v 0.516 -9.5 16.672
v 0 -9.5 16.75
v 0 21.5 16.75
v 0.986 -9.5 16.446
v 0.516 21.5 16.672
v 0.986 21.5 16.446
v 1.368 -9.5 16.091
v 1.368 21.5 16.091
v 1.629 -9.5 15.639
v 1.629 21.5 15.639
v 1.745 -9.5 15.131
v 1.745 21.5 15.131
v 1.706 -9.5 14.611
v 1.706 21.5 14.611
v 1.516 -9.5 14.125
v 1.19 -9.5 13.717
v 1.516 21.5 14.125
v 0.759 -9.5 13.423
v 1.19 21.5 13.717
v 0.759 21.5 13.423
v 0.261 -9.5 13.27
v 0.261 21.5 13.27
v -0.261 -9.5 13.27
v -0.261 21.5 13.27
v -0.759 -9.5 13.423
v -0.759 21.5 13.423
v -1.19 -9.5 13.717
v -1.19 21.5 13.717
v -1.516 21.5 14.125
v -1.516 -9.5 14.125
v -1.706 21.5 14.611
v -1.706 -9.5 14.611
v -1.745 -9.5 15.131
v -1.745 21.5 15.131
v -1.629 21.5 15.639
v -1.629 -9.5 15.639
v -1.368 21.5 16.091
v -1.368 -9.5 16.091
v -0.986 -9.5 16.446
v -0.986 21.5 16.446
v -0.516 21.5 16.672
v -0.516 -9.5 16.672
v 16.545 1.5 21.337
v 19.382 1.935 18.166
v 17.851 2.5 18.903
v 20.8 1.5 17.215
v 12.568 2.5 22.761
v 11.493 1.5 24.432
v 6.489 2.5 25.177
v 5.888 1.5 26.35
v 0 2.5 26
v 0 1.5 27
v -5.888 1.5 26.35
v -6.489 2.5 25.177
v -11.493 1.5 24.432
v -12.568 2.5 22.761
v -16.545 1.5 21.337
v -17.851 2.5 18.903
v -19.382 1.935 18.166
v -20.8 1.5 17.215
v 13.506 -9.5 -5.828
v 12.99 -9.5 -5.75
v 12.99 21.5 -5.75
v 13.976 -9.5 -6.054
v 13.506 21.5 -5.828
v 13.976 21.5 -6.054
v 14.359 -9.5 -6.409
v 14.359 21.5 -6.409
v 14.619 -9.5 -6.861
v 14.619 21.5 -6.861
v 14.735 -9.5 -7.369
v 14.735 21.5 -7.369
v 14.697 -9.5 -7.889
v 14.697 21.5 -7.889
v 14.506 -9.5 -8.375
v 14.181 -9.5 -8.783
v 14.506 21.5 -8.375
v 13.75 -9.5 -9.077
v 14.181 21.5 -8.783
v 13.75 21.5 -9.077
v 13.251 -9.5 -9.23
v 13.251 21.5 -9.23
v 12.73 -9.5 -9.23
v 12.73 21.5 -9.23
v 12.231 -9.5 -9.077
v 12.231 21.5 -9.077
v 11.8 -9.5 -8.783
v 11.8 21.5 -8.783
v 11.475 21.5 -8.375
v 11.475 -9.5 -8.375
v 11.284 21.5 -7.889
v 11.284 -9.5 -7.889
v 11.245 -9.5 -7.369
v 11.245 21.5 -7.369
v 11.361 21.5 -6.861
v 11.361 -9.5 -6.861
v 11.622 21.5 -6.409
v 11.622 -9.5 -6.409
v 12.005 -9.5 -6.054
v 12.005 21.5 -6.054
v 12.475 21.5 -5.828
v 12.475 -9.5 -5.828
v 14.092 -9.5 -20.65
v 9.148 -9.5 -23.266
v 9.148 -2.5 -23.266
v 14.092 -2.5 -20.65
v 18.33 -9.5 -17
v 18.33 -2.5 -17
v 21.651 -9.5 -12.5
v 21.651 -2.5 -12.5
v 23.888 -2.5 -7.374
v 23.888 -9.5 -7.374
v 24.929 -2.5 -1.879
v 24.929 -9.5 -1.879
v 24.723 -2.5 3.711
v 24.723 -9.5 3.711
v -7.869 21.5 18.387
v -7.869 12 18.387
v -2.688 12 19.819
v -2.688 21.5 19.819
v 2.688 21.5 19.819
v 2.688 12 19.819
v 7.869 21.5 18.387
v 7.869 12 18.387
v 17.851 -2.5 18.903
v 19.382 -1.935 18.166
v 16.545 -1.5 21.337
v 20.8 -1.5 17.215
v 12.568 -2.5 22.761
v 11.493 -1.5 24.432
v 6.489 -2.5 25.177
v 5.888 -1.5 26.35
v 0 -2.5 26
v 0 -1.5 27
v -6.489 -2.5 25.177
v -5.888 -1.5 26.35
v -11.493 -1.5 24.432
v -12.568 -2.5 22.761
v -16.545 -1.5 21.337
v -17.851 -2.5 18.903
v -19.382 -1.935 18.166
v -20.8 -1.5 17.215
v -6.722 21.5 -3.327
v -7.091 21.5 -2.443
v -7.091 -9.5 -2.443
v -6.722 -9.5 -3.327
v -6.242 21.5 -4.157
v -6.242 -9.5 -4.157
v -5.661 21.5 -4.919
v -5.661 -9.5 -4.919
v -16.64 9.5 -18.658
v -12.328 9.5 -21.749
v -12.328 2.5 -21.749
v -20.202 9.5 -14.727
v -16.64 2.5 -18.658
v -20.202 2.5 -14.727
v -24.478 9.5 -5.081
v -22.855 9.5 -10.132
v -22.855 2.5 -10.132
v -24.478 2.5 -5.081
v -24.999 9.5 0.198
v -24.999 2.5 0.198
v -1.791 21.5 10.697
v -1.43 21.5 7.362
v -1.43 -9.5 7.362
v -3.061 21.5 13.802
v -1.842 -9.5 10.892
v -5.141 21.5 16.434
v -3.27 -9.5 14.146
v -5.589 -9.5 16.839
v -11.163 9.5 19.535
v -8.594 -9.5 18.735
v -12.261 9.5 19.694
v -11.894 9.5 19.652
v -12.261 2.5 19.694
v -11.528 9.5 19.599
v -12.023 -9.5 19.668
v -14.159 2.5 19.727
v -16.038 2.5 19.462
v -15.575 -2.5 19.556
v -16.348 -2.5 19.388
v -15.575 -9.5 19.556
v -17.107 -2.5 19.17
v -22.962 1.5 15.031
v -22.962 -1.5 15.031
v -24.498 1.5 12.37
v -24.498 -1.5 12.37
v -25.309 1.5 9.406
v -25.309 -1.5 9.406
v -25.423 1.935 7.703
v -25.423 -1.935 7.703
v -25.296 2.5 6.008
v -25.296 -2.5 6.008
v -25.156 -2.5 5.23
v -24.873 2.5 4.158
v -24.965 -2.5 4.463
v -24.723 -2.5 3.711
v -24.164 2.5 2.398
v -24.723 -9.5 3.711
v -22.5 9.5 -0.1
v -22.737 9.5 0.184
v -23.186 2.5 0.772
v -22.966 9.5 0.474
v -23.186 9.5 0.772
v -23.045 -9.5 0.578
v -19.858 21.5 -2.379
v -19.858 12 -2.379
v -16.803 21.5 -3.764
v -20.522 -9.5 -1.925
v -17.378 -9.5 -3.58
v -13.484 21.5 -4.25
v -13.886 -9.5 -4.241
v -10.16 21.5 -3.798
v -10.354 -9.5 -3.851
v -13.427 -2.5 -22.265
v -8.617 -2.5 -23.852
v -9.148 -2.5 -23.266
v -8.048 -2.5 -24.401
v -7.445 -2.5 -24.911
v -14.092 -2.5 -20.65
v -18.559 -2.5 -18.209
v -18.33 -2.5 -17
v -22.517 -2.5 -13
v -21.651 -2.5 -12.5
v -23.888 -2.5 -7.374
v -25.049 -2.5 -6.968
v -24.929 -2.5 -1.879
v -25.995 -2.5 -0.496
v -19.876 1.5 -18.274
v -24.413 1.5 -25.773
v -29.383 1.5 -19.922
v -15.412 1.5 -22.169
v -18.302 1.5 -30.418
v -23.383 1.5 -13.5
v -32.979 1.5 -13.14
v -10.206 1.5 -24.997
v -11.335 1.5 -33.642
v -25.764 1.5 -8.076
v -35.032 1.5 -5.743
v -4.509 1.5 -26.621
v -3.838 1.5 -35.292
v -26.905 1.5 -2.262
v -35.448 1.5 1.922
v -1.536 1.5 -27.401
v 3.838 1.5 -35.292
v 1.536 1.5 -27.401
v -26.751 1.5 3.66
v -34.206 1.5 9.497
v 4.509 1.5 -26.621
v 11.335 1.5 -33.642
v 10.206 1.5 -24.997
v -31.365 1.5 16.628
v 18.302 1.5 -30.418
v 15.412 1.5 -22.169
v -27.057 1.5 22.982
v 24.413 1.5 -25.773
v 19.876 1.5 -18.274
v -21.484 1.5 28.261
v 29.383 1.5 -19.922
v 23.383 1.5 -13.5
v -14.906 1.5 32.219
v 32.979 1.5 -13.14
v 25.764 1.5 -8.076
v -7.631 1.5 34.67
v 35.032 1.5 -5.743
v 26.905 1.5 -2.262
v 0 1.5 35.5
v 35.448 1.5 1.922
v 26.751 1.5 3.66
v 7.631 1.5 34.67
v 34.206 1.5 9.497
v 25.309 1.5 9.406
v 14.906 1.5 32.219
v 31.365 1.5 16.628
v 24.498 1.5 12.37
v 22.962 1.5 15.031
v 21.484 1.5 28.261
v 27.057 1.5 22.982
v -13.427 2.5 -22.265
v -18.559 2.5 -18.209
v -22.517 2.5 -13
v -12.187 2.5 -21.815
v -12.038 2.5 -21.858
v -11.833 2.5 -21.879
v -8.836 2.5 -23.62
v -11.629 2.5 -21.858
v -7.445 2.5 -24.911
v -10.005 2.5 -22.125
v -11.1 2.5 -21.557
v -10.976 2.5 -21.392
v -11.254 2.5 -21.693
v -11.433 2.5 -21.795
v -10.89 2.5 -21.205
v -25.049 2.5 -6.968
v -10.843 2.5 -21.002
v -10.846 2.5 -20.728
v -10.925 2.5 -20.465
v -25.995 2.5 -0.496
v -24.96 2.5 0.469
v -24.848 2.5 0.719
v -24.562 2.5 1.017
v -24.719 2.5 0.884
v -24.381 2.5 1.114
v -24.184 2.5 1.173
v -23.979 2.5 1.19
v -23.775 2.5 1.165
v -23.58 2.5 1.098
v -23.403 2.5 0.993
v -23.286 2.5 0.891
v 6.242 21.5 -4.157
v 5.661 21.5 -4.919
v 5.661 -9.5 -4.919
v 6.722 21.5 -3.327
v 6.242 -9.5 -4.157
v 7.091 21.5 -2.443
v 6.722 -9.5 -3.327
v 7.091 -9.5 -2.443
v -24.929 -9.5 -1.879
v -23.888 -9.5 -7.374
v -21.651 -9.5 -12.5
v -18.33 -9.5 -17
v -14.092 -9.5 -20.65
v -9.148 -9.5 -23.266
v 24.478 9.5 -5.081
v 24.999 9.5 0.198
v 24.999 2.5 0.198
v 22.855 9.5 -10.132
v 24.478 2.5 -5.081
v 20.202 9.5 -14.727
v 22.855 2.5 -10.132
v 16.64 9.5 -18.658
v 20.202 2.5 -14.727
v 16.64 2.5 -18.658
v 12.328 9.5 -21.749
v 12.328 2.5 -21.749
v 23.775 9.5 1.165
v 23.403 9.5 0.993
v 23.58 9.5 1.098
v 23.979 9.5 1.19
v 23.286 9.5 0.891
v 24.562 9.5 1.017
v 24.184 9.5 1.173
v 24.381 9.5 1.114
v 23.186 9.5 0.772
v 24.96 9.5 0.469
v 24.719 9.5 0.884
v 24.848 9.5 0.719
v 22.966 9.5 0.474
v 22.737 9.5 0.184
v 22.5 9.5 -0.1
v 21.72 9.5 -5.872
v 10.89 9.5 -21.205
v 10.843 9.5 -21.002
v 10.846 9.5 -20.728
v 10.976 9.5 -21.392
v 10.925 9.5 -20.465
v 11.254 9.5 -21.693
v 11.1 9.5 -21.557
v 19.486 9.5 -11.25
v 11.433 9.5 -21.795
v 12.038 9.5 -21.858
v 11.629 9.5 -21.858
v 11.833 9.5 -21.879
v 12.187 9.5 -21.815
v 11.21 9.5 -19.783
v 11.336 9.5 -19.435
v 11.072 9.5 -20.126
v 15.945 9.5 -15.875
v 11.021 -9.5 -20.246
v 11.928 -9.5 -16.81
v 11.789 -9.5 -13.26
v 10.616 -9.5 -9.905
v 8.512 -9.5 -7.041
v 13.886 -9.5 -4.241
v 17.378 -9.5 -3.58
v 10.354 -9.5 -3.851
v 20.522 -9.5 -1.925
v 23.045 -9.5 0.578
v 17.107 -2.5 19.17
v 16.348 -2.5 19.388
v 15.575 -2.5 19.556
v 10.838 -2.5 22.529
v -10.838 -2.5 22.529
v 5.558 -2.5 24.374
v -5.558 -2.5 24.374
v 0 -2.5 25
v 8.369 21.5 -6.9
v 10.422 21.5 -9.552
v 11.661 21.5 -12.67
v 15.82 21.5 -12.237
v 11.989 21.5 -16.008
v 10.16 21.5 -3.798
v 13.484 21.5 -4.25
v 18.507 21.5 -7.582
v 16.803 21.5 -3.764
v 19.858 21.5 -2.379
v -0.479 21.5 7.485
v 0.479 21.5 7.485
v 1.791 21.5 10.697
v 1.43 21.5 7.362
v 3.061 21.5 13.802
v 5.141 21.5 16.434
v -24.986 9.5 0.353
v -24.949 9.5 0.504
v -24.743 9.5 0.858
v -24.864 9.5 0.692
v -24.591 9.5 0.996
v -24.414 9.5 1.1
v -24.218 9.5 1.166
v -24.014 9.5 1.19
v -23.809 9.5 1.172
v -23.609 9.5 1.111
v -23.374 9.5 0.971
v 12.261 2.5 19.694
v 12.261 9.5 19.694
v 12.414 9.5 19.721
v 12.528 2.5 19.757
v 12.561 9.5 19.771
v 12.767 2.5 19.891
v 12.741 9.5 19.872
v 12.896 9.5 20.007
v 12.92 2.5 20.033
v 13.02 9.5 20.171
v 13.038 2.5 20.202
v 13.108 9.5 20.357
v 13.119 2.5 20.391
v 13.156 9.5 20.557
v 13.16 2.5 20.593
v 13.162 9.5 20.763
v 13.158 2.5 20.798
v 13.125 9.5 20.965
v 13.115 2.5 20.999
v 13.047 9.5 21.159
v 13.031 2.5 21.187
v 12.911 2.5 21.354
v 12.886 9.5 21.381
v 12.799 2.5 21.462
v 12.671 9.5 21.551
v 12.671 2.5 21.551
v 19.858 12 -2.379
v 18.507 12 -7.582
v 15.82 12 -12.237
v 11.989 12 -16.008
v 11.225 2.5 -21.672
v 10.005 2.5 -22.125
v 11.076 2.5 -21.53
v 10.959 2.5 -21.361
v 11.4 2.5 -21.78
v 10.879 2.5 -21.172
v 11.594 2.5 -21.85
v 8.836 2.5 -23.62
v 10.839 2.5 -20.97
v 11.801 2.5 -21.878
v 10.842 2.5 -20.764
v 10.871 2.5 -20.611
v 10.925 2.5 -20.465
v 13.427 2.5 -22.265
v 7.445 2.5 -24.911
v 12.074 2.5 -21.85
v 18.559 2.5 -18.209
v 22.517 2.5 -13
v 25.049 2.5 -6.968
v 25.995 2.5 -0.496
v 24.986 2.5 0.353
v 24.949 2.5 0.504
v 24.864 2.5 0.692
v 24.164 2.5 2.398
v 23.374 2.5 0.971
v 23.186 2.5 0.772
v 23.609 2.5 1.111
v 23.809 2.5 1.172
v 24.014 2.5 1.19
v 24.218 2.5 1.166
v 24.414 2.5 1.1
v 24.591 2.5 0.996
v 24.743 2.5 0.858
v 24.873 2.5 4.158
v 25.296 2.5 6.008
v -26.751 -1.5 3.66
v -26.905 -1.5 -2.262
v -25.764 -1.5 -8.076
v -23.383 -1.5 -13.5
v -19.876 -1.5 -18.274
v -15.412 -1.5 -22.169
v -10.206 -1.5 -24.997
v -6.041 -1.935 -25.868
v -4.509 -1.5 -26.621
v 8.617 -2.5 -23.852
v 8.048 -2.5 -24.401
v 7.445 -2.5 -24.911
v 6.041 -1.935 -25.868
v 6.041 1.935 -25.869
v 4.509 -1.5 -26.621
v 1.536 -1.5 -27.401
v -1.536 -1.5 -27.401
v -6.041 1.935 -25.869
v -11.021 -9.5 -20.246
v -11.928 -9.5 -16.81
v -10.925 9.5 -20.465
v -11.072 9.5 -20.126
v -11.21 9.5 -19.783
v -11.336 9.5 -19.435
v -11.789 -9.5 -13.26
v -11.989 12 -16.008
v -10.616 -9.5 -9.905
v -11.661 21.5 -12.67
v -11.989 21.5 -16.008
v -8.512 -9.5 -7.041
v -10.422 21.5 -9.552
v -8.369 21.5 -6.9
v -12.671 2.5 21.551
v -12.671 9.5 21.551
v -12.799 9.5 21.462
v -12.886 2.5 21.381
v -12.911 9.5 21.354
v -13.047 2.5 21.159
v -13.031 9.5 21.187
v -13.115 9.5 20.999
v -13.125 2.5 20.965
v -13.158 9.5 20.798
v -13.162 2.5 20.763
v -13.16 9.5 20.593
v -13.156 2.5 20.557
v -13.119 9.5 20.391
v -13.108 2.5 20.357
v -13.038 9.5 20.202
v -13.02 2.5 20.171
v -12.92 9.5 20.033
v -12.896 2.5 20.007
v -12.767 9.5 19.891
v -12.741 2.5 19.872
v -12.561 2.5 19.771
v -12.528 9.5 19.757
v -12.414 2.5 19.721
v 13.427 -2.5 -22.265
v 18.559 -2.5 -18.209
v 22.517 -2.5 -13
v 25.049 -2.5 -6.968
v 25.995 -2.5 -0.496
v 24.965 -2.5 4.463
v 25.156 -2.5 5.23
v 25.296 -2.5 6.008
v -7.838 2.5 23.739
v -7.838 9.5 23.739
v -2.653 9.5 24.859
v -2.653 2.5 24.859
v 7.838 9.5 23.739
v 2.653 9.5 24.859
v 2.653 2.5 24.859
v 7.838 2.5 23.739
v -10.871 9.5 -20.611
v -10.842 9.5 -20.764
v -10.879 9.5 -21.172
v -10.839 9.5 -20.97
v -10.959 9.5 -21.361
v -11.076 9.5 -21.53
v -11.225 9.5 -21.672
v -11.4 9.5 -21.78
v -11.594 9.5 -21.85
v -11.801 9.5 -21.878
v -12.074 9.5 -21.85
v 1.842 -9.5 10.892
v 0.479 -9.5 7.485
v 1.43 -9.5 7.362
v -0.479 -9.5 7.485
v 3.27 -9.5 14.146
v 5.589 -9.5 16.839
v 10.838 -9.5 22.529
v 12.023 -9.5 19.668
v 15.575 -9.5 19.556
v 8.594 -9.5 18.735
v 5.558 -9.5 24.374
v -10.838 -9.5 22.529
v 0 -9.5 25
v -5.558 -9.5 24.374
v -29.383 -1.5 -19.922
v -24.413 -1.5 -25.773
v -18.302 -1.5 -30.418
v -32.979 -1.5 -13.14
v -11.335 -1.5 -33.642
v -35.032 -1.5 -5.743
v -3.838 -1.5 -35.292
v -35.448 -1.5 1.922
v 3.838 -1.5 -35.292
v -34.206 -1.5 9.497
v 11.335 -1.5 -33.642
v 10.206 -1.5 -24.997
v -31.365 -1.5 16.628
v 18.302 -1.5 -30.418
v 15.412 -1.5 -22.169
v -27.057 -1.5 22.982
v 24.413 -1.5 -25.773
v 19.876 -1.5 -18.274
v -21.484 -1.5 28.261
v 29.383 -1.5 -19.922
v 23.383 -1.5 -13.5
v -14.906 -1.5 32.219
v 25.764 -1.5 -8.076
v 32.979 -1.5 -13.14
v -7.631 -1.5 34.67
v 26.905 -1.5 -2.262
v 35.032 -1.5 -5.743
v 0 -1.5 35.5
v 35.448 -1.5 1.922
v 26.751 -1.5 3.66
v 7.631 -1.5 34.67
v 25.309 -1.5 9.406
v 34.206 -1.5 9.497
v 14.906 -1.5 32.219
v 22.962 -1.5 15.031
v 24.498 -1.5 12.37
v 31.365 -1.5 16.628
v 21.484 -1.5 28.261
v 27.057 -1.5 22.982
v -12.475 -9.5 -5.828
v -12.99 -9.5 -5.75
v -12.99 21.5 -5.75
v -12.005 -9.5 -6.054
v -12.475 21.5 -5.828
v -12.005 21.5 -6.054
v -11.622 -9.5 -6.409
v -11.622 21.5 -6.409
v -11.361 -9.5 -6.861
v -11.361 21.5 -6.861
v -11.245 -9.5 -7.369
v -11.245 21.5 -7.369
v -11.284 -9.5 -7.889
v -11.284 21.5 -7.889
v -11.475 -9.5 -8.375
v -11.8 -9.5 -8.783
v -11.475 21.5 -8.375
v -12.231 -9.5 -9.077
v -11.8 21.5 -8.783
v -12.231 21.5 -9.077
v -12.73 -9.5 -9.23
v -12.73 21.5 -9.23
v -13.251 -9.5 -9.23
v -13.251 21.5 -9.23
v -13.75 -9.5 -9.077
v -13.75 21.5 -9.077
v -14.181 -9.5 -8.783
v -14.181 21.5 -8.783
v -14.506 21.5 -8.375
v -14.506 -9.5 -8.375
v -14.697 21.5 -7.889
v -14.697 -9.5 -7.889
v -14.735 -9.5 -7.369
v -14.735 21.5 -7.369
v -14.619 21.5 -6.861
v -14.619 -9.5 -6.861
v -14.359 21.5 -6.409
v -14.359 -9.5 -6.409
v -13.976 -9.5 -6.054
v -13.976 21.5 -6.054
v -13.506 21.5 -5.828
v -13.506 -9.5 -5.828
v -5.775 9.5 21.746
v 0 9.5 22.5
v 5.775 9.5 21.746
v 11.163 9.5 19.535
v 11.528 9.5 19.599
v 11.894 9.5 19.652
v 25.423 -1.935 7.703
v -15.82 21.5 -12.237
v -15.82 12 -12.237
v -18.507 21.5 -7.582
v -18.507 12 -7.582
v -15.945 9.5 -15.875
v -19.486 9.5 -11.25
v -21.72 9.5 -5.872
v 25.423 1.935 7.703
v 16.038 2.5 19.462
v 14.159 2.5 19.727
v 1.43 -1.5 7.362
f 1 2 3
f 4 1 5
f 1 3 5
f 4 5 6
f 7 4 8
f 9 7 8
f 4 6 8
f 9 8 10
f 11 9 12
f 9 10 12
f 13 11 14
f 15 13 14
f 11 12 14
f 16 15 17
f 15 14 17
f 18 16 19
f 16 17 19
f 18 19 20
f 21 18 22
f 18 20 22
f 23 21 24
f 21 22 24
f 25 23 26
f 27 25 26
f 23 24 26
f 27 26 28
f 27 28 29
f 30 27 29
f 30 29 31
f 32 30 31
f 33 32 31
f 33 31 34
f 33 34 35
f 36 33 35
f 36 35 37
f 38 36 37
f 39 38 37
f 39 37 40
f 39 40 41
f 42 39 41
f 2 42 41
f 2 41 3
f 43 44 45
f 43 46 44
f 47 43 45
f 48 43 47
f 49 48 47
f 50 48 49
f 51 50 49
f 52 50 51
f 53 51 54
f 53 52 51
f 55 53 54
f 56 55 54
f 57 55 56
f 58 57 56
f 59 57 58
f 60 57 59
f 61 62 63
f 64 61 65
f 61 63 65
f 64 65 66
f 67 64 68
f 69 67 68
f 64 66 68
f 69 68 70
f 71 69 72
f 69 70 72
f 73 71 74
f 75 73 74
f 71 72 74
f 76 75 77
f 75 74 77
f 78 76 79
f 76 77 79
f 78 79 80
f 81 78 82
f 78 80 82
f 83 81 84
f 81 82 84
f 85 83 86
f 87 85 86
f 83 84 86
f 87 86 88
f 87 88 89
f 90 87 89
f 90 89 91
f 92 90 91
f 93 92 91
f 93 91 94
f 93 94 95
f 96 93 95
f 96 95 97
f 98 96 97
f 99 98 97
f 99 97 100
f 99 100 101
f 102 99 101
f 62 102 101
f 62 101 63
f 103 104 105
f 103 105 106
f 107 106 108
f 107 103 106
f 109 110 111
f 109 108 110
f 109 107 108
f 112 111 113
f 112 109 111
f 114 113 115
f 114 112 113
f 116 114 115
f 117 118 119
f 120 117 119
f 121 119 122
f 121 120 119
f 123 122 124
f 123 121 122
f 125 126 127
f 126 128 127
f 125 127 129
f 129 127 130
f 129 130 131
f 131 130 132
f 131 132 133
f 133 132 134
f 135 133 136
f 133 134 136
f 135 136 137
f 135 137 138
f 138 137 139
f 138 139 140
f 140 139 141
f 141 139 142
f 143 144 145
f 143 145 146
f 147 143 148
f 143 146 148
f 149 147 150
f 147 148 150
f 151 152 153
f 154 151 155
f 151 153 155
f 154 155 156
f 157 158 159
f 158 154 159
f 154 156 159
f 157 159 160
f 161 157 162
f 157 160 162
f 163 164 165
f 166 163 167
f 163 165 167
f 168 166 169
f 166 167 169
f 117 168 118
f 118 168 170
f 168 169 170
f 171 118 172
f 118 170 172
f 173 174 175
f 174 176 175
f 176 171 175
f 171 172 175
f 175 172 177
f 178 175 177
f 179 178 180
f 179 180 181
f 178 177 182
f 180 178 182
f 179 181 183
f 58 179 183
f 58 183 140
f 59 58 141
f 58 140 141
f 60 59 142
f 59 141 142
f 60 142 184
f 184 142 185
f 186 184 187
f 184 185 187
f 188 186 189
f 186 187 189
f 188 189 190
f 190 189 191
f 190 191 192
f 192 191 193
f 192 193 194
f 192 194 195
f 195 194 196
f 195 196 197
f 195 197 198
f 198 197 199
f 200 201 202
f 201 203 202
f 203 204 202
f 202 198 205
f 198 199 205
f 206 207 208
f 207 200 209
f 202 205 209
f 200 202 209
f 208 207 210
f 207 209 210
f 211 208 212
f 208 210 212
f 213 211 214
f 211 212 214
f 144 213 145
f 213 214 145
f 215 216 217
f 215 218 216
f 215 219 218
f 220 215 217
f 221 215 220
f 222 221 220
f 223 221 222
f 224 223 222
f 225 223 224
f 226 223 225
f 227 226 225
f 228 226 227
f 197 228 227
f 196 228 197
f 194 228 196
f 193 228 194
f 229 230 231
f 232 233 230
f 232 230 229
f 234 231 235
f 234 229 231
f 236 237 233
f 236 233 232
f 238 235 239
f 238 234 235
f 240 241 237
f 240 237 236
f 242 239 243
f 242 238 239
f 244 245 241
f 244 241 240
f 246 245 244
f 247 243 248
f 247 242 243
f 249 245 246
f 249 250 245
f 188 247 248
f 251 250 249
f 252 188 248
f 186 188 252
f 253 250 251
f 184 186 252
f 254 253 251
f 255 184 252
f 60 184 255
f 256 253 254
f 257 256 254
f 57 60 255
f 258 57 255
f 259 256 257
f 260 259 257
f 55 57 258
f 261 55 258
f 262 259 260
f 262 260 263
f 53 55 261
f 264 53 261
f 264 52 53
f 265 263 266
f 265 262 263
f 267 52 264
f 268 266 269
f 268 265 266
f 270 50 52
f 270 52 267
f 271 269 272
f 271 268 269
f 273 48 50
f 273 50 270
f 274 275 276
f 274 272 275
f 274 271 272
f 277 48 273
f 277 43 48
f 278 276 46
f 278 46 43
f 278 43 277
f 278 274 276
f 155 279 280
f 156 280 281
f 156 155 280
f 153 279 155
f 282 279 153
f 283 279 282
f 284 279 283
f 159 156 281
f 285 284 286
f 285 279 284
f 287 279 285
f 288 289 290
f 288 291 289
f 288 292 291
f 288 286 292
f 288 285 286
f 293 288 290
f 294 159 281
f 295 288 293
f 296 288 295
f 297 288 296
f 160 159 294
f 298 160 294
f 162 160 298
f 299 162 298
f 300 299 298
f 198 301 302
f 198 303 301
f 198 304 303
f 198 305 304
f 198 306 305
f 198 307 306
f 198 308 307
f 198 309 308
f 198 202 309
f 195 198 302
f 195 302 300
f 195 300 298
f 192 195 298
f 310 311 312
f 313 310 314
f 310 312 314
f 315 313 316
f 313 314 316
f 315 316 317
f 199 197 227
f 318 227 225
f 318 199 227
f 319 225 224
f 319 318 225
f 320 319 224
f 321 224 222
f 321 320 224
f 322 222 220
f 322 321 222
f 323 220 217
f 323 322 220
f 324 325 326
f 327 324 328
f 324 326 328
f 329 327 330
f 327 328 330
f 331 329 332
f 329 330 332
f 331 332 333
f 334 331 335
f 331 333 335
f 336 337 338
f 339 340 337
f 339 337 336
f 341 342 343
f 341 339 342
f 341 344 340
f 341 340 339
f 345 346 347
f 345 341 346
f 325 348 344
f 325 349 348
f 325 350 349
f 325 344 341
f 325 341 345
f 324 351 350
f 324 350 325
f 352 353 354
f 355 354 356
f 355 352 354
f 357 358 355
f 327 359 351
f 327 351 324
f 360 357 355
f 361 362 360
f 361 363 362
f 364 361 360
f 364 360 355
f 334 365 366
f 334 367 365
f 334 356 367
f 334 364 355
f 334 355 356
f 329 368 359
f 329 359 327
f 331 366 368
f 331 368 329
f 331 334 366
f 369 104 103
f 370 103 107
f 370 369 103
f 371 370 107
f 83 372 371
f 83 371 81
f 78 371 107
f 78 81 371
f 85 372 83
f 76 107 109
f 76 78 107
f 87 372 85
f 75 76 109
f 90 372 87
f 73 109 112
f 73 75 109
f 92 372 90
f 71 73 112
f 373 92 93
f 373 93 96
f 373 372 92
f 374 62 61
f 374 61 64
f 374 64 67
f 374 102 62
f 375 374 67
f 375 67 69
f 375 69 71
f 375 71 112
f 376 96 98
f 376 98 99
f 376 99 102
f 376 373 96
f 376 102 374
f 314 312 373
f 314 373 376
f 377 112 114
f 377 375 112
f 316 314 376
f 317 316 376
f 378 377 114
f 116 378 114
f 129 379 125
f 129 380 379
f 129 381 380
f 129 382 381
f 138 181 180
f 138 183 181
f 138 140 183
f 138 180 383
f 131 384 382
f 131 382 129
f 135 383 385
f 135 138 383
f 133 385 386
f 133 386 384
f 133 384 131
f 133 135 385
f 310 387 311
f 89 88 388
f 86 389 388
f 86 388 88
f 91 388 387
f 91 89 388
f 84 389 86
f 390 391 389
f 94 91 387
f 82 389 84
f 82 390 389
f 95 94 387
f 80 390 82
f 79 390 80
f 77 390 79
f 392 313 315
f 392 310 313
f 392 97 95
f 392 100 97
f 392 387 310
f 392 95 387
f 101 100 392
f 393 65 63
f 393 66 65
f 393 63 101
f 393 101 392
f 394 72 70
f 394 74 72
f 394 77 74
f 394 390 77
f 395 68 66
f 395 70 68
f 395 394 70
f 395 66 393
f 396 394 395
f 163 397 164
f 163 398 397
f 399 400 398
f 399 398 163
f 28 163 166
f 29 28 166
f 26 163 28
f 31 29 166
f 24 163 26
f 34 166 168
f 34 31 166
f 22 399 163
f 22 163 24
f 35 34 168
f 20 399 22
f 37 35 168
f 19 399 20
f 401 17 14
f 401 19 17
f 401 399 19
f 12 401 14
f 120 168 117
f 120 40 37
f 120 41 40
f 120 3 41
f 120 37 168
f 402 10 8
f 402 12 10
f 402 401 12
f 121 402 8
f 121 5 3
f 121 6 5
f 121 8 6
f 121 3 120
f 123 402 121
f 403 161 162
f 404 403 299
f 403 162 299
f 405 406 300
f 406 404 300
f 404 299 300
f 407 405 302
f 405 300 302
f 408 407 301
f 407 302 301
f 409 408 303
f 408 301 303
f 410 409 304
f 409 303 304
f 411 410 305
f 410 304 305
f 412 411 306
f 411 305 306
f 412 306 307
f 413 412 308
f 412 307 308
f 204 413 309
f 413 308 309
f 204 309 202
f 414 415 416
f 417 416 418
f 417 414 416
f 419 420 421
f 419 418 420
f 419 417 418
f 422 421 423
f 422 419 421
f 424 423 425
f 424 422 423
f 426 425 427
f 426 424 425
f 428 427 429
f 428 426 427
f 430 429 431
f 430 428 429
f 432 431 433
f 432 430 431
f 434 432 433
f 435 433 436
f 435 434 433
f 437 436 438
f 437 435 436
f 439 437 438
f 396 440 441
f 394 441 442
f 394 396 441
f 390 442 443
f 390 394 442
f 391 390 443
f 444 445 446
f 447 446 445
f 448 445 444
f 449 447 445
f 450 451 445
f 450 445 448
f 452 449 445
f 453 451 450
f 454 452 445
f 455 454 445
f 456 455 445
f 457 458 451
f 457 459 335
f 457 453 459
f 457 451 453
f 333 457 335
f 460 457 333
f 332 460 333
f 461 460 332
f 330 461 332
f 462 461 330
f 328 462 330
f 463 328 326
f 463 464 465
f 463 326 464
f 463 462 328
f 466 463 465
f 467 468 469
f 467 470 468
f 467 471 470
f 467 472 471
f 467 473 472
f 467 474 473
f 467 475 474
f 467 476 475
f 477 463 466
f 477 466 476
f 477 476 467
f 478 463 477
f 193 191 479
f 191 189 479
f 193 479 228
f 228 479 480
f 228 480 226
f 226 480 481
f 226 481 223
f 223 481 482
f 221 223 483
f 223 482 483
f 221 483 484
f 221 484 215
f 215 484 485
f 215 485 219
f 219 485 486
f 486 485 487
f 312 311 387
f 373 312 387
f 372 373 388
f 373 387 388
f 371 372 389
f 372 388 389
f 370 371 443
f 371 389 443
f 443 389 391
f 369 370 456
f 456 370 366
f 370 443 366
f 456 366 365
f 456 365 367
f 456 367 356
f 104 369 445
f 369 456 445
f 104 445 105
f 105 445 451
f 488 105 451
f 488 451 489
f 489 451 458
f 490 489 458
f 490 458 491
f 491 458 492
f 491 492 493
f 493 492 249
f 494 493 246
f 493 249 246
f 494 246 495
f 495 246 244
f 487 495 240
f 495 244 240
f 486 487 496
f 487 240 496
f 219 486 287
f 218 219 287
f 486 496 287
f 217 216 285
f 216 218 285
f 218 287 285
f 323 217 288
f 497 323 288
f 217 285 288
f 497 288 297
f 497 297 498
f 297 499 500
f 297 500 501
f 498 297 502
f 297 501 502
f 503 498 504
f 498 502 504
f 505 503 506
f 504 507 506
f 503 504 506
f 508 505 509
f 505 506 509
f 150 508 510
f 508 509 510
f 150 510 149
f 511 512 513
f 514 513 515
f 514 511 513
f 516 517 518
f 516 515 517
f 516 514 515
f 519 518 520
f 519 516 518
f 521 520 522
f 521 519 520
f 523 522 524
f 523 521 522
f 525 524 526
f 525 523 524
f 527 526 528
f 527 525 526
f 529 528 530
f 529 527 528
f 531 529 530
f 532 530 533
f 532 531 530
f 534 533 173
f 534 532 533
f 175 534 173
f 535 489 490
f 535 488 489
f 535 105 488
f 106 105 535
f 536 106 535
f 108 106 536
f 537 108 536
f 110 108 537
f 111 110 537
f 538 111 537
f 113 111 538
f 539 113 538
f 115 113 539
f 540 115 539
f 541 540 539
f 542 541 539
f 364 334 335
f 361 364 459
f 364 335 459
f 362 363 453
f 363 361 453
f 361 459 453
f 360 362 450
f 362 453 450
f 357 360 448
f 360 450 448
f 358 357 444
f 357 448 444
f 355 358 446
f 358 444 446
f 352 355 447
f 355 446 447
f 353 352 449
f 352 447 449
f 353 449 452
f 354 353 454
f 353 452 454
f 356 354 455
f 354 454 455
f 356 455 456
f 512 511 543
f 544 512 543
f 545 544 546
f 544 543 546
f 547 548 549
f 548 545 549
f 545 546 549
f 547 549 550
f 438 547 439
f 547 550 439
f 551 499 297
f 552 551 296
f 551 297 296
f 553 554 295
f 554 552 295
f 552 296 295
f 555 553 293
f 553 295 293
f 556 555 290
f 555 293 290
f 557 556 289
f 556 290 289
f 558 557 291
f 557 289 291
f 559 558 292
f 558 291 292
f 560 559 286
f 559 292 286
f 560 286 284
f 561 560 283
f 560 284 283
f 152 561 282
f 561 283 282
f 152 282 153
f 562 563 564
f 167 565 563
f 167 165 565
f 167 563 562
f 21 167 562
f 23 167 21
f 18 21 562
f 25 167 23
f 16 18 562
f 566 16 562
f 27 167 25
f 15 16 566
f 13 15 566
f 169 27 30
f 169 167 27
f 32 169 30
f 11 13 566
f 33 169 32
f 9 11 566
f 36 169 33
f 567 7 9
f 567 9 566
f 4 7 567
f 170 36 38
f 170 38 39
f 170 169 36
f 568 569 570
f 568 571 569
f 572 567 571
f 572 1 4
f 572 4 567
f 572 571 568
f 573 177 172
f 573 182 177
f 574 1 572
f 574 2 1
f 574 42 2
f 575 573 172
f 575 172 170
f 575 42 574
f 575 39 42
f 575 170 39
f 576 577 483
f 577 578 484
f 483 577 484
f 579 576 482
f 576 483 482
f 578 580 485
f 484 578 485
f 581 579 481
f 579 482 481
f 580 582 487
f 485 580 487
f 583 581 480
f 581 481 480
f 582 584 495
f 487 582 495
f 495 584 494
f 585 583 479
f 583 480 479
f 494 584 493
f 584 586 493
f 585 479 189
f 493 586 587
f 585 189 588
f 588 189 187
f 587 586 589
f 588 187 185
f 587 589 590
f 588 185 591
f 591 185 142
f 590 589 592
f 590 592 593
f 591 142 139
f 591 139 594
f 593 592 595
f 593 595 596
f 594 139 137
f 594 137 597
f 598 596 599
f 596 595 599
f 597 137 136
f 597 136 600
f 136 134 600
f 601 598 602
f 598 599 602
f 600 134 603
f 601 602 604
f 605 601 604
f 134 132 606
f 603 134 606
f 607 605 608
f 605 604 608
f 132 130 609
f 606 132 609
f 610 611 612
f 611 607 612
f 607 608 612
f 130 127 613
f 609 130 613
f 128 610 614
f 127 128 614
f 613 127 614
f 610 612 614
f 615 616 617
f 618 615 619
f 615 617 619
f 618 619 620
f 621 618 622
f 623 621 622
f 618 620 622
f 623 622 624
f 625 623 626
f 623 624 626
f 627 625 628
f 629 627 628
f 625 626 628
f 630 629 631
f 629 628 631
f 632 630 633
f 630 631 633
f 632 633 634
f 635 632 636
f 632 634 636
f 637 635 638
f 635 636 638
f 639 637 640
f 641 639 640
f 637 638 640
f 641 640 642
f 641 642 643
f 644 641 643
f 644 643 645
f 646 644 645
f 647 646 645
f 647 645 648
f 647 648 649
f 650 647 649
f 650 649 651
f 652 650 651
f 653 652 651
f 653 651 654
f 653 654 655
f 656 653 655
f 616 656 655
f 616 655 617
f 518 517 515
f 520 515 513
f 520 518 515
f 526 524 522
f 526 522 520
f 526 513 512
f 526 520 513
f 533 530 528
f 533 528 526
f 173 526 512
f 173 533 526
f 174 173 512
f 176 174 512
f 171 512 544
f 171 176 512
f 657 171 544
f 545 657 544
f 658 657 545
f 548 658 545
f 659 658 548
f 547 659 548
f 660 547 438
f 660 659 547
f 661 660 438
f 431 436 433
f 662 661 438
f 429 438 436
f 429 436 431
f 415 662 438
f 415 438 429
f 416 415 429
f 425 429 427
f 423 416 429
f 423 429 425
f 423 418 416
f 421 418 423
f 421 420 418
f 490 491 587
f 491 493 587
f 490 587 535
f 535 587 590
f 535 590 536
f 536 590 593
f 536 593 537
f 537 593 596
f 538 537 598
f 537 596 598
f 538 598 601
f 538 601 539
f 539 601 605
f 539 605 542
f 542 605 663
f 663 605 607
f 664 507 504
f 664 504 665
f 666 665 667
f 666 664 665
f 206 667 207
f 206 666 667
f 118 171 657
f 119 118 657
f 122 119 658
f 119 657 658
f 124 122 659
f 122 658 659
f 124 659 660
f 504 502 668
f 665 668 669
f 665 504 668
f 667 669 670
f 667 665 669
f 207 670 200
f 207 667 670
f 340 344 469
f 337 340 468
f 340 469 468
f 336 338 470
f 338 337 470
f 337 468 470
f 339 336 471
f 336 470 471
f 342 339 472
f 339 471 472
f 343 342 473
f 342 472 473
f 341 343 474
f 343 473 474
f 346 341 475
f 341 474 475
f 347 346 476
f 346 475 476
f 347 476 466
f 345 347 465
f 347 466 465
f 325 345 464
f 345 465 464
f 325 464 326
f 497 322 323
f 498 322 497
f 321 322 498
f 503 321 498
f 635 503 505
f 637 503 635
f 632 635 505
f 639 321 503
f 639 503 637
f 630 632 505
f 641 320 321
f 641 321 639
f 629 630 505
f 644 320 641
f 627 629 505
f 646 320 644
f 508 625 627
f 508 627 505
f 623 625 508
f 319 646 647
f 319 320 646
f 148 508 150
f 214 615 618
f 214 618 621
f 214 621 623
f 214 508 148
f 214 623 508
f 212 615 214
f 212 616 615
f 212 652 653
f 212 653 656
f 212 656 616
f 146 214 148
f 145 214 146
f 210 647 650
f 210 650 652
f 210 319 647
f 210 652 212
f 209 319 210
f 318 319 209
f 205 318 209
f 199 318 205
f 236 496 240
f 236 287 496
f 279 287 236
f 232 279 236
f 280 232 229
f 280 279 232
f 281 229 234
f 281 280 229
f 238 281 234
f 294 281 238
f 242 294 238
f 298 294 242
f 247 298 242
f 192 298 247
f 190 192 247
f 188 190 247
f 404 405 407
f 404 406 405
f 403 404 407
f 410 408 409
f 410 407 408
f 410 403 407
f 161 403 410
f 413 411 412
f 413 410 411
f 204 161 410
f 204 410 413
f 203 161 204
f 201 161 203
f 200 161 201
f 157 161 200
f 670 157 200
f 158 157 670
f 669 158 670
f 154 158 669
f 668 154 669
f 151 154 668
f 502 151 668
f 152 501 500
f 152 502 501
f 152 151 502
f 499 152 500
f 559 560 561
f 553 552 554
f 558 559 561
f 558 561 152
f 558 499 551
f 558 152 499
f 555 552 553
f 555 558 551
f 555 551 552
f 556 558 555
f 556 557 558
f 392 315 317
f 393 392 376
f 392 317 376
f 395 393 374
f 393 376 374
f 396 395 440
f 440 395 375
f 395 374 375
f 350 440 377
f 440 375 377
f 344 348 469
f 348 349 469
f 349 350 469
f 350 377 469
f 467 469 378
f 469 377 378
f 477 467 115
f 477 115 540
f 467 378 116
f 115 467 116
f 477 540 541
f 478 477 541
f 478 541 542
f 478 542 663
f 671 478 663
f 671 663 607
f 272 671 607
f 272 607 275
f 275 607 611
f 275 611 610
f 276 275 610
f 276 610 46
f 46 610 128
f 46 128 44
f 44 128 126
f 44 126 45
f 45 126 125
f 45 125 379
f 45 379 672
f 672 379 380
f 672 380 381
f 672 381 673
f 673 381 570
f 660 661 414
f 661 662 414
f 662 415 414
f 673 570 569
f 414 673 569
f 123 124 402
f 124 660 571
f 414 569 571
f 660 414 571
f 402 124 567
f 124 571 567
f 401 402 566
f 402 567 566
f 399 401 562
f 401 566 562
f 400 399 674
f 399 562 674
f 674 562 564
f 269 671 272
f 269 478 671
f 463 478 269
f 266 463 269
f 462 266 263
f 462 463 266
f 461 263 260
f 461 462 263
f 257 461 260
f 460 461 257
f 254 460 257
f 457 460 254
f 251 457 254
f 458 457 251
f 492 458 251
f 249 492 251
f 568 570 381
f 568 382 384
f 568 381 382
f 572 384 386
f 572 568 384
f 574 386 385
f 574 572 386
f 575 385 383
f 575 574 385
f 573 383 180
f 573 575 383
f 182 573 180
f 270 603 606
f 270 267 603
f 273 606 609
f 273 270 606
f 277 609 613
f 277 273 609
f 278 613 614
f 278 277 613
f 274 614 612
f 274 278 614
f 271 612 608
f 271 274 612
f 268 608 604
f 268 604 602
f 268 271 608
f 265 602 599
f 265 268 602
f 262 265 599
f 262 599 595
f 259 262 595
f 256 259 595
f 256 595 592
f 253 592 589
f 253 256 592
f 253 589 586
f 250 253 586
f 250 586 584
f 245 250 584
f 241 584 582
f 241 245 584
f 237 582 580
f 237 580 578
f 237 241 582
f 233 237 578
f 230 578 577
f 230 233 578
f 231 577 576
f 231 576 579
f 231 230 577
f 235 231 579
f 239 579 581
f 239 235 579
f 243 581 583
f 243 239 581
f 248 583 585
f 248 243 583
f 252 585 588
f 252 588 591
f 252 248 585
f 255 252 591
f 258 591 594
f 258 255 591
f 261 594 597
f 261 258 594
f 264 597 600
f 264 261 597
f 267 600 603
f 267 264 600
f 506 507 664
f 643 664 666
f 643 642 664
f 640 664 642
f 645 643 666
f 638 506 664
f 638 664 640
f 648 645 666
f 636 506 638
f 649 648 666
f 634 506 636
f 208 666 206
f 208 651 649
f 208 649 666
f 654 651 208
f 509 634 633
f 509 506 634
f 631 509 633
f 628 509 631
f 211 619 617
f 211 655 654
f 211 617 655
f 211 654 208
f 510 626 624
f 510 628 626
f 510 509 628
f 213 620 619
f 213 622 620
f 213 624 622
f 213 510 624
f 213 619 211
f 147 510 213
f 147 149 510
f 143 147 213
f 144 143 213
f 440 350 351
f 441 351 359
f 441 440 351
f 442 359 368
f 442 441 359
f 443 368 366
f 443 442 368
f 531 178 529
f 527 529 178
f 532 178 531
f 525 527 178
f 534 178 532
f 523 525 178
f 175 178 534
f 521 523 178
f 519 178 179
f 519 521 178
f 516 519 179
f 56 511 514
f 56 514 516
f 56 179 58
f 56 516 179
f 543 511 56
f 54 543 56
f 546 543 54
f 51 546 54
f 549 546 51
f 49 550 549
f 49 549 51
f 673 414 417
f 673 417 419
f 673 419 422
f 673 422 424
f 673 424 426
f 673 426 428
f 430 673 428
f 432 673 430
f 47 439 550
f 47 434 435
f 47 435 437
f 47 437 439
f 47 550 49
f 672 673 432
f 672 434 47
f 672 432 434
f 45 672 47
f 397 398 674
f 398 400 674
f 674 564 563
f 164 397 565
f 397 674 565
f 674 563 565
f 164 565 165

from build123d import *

# Parameters (mm, degrees)
SKETCH1_R           = 35.5
BOSS_EXTRUDE1_DEPTH = 1.5
SKETCH2_R           = 26
BOSS_EXTRUDE2_DEPTH = 1
SKETCH3_R           = 25
BOSS_EXTRUDE3_DEPTH = 19
SKETCH4_R           = 12
CUT_EXTRUDE1_DEPTH  = 56.222278113
SKETCH5_R           = 7.5
CUT_EXTRUDE2_DEPTH  = 56.222278113
FILLET1_R           = 1
SKETCH6_R           = 30.018937713
SKETCH6_R_2         = 20
CUT_EXTRUDE3_DEPTH  = 12
CHAMFER2_SIZE       = 2.5
BOSS_EXTRUDE4_START = 8
SKETCH8_R           = 25
BOSS_EXTRUDE4_DEPTH = 8
SKETCH10_R          = 7.5
CUT_EXTRUDE6_DEPTH  = 60.004237189
SKETCH7_R           = 1.75
CUT_EXTRUDE4_DEPTH  = 60.004237136
BOSS_EXTRUDE5_START = 1
SKETCH11_R          = 26
SKETCH11_R_2        = 25
BOSS_EXTRUDE5_DEPTH = 1
SKETCH9_R           = 12
CUT_EXTRUDE5_DEPTH  = 60.004237189
CHAMFER1_SIZE       = 1


with BuildPart() as part:
    # Sketch1 → Boss-Extrude1 (new, symmetric)
    with BuildSketch(Plane(origin=(0, 0, 0), x_dir=(1, 0, 0), z_dir=(0, 1, 0))):
        with Locations(Location((0, 0, 0), (0, 0, 270))):
            Circle(SKETCH1_R)
    extrude(amount=BOSS_EXTRUDE1_DEPTH, both=True)

    # Sketch2 → Boss-Extrude2 (add)
    with BuildSketch(Plane(origin=(0, 1.5, 0), x_dir=(1, 0, 0), z_dir=(0, 1, 0))):
        with Locations(Location((0, 0, 0), (0, 0, 270))):
            Circle(SKETCH2_R)
    extrude(amount=BOSS_EXTRUDE2_DEPTH)

    # Sketch3 → Boss-Extrude3 (add)
    with BuildSketch(Plane(origin=(0, 2.5, 0), x_dir=(1, 0, 0), z_dir=(0, 1, 0))):
        with Locations(Location((0, 0, 0), (0, 0, 270))):
            Circle(SKETCH3_R)
    extrude(amount=BOSS_EXTRUDE3_DEPTH)

    # Sketch4 → Cut-Extrude1 (cut, through all)
    with BuildSketch(Plane(origin=(0, 21.5, 0), x_dir=(1, 0, 0), z_dir=(0, 1, 0))):
        with Locations(Location((0, 15.5, 0), (0, 0, 270))):
            Circle(SKETCH4_R)
        with Locations(Location((13.423393759, -7.75, 0), (0, 0, 270))):
            Circle(SKETCH4_R)
        with Locations(Location((-13.423393759, -7.75, 0), (0, 0, 270))):
            Circle(SKETCH4_R)
    extrude(amount=-CUT_EXTRUDE1_DEPTH, mode=Mode.SUBTRACT)

    # Sketch5 → Cut-Extrude2 (cut, through all)
    with BuildSketch(Plane(origin=(0, 21.5, 0), x_dir=(1, 0, 0), z_dir=(0, 1, 0))):
        Circle(SKETCH5_R)
    extrude(amount=-CUT_EXTRUDE2_DEPTH, mode=Mode.SUBTRACT)

    # Fillet1
    fillet1_edges = [part.edges().sort_by_distance(p)[0] for p in [
        (-24.723095296, 12, 3.710600891),
        (-15.575022283, 12, 19.555528141),
        (15.575022283, 12, 19.555528141),
        (24.723095296, 12, 3.710600891),
        (9.148073013, 12, -23.266129032),
        (-9.148073013, 12, -23.266129032),
    ]]
    fillet(fillet1_edges, radius=FILLET1_R)

    # Sketch6 → Cut-Extrude3 (cut)
    with BuildSketch(Plane(origin=(0, 21.5, 0), x_dir=(1, 0, 0), z_dir=(0, 1, 0))):
        Circle(SKETCH6_R)
        Circle(SKETCH6_R_2, mode=Mode.SUBTRACT)
    extrude(amount=-CUT_EXTRUDE3_DEPTH, mode=Mode.SUBTRACT)

    # Chamfer2
    chamfer2_edges = [part.edges().sort_by_distance(p)[0] for p in [
        (17.320508076, 9.5, -10),
        (-17.320508076, 9.5, -10),
        (0, 9.5, 20),
    ]]
    chamfer(chamfer2_edges, length=CHAMFER2_SIZE)

    # Sketch8 → Boss-Extrude4 (add)
    with BuildSketch(Plane.XZ.offset(1.5).offset(BOSS_EXTRUDE4_START)):
        with Locations(Location((0, 0, 0), (0, 0, 51.464391847))):
            Circle(SKETCH8_R)
    extrude(amount=-BOSS_EXTRUDE4_DEPTH)

    # Sketch10 → Cut-Extrude6 (cut, through all)
    with BuildSketch(Plane.XZ.offset(9.5)):
        with Locations(Location((0, 0, 0), (0, 0, 79.011010973))):
            Circle(SKETCH10_R)
    extrude(amount=-CUT_EXTRUDE6_DEPTH, mode=Mode.SUBTRACT)

    # Sketch7 → Cut-Extrude4 (cut, through all)
    with BuildSketch(Plane(origin=(0, 21.5, 0), x_dir=(1, 0, 0), z_dir=(0, 1, 0))):
        with Locations(Location((0, -15, 0), (0, 0, 270))):
            Circle(SKETCH7_R)
        with Locations(Location((-12.990381057, 7.5, 0), (0, 0, 270))):
            Circle(SKETCH7_R)
        with Locations(Location((12.990381057, 7.5, 0), (0, 0, 270))):
            Circle(SKETCH7_R)
    extrude(amount=-CUT_EXTRUDE4_DEPTH, mode=Mode.SUBTRACT)

    # Sketch11 → Boss-Extrude5 (add)
    with BuildSketch(Plane.XZ.offset(1.5).offset(BOSS_EXTRUDE5_START)):
        with Locations(Location((0, 0, 0), (0, 0, 46.639268068))):
            Circle(SKETCH11_R)
        with Locations(Location((0, 0, 0), (0, 0, 270))):
            Circle(SKETCH11_R_2, mode=Mode.SUBTRACT)
    extrude(amount=-BOSS_EXTRUDE5_DEPTH)

    # Sketch9 → Cut-Extrude5 (cut, through all)
    with BuildSketch(Plane.XZ.offset(9.5)):
        with Locations((-13.423393759, 7.75)):
            Circle(SKETCH9_R)
        with Locations((13.423393759, 7.75)):
            Circle(SKETCH9_R)
        with Locations((0, -15.5)):
            Circle(SKETCH9_R)
    extrude(amount=-CUT_EXTRUDE5_DEPTH, mode=Mode.SUBTRACT)

    # Chamfer1
    chamfer1_2_edges = [part.edges().sort_by_distance(p)[0] for p in [
        (-22.516660498, 1.5, -13),
        (22.516660498, 1.5, -13),
        (0, 1.5, 26),
        (22.516660498, -1.5, -13),
        (0, -1.5, 26),
        (-22.516660498, -1.5, -13),
    ]]
    chamfer(chamfer1_2_edges, length=CHAMFER1_SIZE - 0.0001)  # a hair under: the kernel refuses the full size


solid = part.part
